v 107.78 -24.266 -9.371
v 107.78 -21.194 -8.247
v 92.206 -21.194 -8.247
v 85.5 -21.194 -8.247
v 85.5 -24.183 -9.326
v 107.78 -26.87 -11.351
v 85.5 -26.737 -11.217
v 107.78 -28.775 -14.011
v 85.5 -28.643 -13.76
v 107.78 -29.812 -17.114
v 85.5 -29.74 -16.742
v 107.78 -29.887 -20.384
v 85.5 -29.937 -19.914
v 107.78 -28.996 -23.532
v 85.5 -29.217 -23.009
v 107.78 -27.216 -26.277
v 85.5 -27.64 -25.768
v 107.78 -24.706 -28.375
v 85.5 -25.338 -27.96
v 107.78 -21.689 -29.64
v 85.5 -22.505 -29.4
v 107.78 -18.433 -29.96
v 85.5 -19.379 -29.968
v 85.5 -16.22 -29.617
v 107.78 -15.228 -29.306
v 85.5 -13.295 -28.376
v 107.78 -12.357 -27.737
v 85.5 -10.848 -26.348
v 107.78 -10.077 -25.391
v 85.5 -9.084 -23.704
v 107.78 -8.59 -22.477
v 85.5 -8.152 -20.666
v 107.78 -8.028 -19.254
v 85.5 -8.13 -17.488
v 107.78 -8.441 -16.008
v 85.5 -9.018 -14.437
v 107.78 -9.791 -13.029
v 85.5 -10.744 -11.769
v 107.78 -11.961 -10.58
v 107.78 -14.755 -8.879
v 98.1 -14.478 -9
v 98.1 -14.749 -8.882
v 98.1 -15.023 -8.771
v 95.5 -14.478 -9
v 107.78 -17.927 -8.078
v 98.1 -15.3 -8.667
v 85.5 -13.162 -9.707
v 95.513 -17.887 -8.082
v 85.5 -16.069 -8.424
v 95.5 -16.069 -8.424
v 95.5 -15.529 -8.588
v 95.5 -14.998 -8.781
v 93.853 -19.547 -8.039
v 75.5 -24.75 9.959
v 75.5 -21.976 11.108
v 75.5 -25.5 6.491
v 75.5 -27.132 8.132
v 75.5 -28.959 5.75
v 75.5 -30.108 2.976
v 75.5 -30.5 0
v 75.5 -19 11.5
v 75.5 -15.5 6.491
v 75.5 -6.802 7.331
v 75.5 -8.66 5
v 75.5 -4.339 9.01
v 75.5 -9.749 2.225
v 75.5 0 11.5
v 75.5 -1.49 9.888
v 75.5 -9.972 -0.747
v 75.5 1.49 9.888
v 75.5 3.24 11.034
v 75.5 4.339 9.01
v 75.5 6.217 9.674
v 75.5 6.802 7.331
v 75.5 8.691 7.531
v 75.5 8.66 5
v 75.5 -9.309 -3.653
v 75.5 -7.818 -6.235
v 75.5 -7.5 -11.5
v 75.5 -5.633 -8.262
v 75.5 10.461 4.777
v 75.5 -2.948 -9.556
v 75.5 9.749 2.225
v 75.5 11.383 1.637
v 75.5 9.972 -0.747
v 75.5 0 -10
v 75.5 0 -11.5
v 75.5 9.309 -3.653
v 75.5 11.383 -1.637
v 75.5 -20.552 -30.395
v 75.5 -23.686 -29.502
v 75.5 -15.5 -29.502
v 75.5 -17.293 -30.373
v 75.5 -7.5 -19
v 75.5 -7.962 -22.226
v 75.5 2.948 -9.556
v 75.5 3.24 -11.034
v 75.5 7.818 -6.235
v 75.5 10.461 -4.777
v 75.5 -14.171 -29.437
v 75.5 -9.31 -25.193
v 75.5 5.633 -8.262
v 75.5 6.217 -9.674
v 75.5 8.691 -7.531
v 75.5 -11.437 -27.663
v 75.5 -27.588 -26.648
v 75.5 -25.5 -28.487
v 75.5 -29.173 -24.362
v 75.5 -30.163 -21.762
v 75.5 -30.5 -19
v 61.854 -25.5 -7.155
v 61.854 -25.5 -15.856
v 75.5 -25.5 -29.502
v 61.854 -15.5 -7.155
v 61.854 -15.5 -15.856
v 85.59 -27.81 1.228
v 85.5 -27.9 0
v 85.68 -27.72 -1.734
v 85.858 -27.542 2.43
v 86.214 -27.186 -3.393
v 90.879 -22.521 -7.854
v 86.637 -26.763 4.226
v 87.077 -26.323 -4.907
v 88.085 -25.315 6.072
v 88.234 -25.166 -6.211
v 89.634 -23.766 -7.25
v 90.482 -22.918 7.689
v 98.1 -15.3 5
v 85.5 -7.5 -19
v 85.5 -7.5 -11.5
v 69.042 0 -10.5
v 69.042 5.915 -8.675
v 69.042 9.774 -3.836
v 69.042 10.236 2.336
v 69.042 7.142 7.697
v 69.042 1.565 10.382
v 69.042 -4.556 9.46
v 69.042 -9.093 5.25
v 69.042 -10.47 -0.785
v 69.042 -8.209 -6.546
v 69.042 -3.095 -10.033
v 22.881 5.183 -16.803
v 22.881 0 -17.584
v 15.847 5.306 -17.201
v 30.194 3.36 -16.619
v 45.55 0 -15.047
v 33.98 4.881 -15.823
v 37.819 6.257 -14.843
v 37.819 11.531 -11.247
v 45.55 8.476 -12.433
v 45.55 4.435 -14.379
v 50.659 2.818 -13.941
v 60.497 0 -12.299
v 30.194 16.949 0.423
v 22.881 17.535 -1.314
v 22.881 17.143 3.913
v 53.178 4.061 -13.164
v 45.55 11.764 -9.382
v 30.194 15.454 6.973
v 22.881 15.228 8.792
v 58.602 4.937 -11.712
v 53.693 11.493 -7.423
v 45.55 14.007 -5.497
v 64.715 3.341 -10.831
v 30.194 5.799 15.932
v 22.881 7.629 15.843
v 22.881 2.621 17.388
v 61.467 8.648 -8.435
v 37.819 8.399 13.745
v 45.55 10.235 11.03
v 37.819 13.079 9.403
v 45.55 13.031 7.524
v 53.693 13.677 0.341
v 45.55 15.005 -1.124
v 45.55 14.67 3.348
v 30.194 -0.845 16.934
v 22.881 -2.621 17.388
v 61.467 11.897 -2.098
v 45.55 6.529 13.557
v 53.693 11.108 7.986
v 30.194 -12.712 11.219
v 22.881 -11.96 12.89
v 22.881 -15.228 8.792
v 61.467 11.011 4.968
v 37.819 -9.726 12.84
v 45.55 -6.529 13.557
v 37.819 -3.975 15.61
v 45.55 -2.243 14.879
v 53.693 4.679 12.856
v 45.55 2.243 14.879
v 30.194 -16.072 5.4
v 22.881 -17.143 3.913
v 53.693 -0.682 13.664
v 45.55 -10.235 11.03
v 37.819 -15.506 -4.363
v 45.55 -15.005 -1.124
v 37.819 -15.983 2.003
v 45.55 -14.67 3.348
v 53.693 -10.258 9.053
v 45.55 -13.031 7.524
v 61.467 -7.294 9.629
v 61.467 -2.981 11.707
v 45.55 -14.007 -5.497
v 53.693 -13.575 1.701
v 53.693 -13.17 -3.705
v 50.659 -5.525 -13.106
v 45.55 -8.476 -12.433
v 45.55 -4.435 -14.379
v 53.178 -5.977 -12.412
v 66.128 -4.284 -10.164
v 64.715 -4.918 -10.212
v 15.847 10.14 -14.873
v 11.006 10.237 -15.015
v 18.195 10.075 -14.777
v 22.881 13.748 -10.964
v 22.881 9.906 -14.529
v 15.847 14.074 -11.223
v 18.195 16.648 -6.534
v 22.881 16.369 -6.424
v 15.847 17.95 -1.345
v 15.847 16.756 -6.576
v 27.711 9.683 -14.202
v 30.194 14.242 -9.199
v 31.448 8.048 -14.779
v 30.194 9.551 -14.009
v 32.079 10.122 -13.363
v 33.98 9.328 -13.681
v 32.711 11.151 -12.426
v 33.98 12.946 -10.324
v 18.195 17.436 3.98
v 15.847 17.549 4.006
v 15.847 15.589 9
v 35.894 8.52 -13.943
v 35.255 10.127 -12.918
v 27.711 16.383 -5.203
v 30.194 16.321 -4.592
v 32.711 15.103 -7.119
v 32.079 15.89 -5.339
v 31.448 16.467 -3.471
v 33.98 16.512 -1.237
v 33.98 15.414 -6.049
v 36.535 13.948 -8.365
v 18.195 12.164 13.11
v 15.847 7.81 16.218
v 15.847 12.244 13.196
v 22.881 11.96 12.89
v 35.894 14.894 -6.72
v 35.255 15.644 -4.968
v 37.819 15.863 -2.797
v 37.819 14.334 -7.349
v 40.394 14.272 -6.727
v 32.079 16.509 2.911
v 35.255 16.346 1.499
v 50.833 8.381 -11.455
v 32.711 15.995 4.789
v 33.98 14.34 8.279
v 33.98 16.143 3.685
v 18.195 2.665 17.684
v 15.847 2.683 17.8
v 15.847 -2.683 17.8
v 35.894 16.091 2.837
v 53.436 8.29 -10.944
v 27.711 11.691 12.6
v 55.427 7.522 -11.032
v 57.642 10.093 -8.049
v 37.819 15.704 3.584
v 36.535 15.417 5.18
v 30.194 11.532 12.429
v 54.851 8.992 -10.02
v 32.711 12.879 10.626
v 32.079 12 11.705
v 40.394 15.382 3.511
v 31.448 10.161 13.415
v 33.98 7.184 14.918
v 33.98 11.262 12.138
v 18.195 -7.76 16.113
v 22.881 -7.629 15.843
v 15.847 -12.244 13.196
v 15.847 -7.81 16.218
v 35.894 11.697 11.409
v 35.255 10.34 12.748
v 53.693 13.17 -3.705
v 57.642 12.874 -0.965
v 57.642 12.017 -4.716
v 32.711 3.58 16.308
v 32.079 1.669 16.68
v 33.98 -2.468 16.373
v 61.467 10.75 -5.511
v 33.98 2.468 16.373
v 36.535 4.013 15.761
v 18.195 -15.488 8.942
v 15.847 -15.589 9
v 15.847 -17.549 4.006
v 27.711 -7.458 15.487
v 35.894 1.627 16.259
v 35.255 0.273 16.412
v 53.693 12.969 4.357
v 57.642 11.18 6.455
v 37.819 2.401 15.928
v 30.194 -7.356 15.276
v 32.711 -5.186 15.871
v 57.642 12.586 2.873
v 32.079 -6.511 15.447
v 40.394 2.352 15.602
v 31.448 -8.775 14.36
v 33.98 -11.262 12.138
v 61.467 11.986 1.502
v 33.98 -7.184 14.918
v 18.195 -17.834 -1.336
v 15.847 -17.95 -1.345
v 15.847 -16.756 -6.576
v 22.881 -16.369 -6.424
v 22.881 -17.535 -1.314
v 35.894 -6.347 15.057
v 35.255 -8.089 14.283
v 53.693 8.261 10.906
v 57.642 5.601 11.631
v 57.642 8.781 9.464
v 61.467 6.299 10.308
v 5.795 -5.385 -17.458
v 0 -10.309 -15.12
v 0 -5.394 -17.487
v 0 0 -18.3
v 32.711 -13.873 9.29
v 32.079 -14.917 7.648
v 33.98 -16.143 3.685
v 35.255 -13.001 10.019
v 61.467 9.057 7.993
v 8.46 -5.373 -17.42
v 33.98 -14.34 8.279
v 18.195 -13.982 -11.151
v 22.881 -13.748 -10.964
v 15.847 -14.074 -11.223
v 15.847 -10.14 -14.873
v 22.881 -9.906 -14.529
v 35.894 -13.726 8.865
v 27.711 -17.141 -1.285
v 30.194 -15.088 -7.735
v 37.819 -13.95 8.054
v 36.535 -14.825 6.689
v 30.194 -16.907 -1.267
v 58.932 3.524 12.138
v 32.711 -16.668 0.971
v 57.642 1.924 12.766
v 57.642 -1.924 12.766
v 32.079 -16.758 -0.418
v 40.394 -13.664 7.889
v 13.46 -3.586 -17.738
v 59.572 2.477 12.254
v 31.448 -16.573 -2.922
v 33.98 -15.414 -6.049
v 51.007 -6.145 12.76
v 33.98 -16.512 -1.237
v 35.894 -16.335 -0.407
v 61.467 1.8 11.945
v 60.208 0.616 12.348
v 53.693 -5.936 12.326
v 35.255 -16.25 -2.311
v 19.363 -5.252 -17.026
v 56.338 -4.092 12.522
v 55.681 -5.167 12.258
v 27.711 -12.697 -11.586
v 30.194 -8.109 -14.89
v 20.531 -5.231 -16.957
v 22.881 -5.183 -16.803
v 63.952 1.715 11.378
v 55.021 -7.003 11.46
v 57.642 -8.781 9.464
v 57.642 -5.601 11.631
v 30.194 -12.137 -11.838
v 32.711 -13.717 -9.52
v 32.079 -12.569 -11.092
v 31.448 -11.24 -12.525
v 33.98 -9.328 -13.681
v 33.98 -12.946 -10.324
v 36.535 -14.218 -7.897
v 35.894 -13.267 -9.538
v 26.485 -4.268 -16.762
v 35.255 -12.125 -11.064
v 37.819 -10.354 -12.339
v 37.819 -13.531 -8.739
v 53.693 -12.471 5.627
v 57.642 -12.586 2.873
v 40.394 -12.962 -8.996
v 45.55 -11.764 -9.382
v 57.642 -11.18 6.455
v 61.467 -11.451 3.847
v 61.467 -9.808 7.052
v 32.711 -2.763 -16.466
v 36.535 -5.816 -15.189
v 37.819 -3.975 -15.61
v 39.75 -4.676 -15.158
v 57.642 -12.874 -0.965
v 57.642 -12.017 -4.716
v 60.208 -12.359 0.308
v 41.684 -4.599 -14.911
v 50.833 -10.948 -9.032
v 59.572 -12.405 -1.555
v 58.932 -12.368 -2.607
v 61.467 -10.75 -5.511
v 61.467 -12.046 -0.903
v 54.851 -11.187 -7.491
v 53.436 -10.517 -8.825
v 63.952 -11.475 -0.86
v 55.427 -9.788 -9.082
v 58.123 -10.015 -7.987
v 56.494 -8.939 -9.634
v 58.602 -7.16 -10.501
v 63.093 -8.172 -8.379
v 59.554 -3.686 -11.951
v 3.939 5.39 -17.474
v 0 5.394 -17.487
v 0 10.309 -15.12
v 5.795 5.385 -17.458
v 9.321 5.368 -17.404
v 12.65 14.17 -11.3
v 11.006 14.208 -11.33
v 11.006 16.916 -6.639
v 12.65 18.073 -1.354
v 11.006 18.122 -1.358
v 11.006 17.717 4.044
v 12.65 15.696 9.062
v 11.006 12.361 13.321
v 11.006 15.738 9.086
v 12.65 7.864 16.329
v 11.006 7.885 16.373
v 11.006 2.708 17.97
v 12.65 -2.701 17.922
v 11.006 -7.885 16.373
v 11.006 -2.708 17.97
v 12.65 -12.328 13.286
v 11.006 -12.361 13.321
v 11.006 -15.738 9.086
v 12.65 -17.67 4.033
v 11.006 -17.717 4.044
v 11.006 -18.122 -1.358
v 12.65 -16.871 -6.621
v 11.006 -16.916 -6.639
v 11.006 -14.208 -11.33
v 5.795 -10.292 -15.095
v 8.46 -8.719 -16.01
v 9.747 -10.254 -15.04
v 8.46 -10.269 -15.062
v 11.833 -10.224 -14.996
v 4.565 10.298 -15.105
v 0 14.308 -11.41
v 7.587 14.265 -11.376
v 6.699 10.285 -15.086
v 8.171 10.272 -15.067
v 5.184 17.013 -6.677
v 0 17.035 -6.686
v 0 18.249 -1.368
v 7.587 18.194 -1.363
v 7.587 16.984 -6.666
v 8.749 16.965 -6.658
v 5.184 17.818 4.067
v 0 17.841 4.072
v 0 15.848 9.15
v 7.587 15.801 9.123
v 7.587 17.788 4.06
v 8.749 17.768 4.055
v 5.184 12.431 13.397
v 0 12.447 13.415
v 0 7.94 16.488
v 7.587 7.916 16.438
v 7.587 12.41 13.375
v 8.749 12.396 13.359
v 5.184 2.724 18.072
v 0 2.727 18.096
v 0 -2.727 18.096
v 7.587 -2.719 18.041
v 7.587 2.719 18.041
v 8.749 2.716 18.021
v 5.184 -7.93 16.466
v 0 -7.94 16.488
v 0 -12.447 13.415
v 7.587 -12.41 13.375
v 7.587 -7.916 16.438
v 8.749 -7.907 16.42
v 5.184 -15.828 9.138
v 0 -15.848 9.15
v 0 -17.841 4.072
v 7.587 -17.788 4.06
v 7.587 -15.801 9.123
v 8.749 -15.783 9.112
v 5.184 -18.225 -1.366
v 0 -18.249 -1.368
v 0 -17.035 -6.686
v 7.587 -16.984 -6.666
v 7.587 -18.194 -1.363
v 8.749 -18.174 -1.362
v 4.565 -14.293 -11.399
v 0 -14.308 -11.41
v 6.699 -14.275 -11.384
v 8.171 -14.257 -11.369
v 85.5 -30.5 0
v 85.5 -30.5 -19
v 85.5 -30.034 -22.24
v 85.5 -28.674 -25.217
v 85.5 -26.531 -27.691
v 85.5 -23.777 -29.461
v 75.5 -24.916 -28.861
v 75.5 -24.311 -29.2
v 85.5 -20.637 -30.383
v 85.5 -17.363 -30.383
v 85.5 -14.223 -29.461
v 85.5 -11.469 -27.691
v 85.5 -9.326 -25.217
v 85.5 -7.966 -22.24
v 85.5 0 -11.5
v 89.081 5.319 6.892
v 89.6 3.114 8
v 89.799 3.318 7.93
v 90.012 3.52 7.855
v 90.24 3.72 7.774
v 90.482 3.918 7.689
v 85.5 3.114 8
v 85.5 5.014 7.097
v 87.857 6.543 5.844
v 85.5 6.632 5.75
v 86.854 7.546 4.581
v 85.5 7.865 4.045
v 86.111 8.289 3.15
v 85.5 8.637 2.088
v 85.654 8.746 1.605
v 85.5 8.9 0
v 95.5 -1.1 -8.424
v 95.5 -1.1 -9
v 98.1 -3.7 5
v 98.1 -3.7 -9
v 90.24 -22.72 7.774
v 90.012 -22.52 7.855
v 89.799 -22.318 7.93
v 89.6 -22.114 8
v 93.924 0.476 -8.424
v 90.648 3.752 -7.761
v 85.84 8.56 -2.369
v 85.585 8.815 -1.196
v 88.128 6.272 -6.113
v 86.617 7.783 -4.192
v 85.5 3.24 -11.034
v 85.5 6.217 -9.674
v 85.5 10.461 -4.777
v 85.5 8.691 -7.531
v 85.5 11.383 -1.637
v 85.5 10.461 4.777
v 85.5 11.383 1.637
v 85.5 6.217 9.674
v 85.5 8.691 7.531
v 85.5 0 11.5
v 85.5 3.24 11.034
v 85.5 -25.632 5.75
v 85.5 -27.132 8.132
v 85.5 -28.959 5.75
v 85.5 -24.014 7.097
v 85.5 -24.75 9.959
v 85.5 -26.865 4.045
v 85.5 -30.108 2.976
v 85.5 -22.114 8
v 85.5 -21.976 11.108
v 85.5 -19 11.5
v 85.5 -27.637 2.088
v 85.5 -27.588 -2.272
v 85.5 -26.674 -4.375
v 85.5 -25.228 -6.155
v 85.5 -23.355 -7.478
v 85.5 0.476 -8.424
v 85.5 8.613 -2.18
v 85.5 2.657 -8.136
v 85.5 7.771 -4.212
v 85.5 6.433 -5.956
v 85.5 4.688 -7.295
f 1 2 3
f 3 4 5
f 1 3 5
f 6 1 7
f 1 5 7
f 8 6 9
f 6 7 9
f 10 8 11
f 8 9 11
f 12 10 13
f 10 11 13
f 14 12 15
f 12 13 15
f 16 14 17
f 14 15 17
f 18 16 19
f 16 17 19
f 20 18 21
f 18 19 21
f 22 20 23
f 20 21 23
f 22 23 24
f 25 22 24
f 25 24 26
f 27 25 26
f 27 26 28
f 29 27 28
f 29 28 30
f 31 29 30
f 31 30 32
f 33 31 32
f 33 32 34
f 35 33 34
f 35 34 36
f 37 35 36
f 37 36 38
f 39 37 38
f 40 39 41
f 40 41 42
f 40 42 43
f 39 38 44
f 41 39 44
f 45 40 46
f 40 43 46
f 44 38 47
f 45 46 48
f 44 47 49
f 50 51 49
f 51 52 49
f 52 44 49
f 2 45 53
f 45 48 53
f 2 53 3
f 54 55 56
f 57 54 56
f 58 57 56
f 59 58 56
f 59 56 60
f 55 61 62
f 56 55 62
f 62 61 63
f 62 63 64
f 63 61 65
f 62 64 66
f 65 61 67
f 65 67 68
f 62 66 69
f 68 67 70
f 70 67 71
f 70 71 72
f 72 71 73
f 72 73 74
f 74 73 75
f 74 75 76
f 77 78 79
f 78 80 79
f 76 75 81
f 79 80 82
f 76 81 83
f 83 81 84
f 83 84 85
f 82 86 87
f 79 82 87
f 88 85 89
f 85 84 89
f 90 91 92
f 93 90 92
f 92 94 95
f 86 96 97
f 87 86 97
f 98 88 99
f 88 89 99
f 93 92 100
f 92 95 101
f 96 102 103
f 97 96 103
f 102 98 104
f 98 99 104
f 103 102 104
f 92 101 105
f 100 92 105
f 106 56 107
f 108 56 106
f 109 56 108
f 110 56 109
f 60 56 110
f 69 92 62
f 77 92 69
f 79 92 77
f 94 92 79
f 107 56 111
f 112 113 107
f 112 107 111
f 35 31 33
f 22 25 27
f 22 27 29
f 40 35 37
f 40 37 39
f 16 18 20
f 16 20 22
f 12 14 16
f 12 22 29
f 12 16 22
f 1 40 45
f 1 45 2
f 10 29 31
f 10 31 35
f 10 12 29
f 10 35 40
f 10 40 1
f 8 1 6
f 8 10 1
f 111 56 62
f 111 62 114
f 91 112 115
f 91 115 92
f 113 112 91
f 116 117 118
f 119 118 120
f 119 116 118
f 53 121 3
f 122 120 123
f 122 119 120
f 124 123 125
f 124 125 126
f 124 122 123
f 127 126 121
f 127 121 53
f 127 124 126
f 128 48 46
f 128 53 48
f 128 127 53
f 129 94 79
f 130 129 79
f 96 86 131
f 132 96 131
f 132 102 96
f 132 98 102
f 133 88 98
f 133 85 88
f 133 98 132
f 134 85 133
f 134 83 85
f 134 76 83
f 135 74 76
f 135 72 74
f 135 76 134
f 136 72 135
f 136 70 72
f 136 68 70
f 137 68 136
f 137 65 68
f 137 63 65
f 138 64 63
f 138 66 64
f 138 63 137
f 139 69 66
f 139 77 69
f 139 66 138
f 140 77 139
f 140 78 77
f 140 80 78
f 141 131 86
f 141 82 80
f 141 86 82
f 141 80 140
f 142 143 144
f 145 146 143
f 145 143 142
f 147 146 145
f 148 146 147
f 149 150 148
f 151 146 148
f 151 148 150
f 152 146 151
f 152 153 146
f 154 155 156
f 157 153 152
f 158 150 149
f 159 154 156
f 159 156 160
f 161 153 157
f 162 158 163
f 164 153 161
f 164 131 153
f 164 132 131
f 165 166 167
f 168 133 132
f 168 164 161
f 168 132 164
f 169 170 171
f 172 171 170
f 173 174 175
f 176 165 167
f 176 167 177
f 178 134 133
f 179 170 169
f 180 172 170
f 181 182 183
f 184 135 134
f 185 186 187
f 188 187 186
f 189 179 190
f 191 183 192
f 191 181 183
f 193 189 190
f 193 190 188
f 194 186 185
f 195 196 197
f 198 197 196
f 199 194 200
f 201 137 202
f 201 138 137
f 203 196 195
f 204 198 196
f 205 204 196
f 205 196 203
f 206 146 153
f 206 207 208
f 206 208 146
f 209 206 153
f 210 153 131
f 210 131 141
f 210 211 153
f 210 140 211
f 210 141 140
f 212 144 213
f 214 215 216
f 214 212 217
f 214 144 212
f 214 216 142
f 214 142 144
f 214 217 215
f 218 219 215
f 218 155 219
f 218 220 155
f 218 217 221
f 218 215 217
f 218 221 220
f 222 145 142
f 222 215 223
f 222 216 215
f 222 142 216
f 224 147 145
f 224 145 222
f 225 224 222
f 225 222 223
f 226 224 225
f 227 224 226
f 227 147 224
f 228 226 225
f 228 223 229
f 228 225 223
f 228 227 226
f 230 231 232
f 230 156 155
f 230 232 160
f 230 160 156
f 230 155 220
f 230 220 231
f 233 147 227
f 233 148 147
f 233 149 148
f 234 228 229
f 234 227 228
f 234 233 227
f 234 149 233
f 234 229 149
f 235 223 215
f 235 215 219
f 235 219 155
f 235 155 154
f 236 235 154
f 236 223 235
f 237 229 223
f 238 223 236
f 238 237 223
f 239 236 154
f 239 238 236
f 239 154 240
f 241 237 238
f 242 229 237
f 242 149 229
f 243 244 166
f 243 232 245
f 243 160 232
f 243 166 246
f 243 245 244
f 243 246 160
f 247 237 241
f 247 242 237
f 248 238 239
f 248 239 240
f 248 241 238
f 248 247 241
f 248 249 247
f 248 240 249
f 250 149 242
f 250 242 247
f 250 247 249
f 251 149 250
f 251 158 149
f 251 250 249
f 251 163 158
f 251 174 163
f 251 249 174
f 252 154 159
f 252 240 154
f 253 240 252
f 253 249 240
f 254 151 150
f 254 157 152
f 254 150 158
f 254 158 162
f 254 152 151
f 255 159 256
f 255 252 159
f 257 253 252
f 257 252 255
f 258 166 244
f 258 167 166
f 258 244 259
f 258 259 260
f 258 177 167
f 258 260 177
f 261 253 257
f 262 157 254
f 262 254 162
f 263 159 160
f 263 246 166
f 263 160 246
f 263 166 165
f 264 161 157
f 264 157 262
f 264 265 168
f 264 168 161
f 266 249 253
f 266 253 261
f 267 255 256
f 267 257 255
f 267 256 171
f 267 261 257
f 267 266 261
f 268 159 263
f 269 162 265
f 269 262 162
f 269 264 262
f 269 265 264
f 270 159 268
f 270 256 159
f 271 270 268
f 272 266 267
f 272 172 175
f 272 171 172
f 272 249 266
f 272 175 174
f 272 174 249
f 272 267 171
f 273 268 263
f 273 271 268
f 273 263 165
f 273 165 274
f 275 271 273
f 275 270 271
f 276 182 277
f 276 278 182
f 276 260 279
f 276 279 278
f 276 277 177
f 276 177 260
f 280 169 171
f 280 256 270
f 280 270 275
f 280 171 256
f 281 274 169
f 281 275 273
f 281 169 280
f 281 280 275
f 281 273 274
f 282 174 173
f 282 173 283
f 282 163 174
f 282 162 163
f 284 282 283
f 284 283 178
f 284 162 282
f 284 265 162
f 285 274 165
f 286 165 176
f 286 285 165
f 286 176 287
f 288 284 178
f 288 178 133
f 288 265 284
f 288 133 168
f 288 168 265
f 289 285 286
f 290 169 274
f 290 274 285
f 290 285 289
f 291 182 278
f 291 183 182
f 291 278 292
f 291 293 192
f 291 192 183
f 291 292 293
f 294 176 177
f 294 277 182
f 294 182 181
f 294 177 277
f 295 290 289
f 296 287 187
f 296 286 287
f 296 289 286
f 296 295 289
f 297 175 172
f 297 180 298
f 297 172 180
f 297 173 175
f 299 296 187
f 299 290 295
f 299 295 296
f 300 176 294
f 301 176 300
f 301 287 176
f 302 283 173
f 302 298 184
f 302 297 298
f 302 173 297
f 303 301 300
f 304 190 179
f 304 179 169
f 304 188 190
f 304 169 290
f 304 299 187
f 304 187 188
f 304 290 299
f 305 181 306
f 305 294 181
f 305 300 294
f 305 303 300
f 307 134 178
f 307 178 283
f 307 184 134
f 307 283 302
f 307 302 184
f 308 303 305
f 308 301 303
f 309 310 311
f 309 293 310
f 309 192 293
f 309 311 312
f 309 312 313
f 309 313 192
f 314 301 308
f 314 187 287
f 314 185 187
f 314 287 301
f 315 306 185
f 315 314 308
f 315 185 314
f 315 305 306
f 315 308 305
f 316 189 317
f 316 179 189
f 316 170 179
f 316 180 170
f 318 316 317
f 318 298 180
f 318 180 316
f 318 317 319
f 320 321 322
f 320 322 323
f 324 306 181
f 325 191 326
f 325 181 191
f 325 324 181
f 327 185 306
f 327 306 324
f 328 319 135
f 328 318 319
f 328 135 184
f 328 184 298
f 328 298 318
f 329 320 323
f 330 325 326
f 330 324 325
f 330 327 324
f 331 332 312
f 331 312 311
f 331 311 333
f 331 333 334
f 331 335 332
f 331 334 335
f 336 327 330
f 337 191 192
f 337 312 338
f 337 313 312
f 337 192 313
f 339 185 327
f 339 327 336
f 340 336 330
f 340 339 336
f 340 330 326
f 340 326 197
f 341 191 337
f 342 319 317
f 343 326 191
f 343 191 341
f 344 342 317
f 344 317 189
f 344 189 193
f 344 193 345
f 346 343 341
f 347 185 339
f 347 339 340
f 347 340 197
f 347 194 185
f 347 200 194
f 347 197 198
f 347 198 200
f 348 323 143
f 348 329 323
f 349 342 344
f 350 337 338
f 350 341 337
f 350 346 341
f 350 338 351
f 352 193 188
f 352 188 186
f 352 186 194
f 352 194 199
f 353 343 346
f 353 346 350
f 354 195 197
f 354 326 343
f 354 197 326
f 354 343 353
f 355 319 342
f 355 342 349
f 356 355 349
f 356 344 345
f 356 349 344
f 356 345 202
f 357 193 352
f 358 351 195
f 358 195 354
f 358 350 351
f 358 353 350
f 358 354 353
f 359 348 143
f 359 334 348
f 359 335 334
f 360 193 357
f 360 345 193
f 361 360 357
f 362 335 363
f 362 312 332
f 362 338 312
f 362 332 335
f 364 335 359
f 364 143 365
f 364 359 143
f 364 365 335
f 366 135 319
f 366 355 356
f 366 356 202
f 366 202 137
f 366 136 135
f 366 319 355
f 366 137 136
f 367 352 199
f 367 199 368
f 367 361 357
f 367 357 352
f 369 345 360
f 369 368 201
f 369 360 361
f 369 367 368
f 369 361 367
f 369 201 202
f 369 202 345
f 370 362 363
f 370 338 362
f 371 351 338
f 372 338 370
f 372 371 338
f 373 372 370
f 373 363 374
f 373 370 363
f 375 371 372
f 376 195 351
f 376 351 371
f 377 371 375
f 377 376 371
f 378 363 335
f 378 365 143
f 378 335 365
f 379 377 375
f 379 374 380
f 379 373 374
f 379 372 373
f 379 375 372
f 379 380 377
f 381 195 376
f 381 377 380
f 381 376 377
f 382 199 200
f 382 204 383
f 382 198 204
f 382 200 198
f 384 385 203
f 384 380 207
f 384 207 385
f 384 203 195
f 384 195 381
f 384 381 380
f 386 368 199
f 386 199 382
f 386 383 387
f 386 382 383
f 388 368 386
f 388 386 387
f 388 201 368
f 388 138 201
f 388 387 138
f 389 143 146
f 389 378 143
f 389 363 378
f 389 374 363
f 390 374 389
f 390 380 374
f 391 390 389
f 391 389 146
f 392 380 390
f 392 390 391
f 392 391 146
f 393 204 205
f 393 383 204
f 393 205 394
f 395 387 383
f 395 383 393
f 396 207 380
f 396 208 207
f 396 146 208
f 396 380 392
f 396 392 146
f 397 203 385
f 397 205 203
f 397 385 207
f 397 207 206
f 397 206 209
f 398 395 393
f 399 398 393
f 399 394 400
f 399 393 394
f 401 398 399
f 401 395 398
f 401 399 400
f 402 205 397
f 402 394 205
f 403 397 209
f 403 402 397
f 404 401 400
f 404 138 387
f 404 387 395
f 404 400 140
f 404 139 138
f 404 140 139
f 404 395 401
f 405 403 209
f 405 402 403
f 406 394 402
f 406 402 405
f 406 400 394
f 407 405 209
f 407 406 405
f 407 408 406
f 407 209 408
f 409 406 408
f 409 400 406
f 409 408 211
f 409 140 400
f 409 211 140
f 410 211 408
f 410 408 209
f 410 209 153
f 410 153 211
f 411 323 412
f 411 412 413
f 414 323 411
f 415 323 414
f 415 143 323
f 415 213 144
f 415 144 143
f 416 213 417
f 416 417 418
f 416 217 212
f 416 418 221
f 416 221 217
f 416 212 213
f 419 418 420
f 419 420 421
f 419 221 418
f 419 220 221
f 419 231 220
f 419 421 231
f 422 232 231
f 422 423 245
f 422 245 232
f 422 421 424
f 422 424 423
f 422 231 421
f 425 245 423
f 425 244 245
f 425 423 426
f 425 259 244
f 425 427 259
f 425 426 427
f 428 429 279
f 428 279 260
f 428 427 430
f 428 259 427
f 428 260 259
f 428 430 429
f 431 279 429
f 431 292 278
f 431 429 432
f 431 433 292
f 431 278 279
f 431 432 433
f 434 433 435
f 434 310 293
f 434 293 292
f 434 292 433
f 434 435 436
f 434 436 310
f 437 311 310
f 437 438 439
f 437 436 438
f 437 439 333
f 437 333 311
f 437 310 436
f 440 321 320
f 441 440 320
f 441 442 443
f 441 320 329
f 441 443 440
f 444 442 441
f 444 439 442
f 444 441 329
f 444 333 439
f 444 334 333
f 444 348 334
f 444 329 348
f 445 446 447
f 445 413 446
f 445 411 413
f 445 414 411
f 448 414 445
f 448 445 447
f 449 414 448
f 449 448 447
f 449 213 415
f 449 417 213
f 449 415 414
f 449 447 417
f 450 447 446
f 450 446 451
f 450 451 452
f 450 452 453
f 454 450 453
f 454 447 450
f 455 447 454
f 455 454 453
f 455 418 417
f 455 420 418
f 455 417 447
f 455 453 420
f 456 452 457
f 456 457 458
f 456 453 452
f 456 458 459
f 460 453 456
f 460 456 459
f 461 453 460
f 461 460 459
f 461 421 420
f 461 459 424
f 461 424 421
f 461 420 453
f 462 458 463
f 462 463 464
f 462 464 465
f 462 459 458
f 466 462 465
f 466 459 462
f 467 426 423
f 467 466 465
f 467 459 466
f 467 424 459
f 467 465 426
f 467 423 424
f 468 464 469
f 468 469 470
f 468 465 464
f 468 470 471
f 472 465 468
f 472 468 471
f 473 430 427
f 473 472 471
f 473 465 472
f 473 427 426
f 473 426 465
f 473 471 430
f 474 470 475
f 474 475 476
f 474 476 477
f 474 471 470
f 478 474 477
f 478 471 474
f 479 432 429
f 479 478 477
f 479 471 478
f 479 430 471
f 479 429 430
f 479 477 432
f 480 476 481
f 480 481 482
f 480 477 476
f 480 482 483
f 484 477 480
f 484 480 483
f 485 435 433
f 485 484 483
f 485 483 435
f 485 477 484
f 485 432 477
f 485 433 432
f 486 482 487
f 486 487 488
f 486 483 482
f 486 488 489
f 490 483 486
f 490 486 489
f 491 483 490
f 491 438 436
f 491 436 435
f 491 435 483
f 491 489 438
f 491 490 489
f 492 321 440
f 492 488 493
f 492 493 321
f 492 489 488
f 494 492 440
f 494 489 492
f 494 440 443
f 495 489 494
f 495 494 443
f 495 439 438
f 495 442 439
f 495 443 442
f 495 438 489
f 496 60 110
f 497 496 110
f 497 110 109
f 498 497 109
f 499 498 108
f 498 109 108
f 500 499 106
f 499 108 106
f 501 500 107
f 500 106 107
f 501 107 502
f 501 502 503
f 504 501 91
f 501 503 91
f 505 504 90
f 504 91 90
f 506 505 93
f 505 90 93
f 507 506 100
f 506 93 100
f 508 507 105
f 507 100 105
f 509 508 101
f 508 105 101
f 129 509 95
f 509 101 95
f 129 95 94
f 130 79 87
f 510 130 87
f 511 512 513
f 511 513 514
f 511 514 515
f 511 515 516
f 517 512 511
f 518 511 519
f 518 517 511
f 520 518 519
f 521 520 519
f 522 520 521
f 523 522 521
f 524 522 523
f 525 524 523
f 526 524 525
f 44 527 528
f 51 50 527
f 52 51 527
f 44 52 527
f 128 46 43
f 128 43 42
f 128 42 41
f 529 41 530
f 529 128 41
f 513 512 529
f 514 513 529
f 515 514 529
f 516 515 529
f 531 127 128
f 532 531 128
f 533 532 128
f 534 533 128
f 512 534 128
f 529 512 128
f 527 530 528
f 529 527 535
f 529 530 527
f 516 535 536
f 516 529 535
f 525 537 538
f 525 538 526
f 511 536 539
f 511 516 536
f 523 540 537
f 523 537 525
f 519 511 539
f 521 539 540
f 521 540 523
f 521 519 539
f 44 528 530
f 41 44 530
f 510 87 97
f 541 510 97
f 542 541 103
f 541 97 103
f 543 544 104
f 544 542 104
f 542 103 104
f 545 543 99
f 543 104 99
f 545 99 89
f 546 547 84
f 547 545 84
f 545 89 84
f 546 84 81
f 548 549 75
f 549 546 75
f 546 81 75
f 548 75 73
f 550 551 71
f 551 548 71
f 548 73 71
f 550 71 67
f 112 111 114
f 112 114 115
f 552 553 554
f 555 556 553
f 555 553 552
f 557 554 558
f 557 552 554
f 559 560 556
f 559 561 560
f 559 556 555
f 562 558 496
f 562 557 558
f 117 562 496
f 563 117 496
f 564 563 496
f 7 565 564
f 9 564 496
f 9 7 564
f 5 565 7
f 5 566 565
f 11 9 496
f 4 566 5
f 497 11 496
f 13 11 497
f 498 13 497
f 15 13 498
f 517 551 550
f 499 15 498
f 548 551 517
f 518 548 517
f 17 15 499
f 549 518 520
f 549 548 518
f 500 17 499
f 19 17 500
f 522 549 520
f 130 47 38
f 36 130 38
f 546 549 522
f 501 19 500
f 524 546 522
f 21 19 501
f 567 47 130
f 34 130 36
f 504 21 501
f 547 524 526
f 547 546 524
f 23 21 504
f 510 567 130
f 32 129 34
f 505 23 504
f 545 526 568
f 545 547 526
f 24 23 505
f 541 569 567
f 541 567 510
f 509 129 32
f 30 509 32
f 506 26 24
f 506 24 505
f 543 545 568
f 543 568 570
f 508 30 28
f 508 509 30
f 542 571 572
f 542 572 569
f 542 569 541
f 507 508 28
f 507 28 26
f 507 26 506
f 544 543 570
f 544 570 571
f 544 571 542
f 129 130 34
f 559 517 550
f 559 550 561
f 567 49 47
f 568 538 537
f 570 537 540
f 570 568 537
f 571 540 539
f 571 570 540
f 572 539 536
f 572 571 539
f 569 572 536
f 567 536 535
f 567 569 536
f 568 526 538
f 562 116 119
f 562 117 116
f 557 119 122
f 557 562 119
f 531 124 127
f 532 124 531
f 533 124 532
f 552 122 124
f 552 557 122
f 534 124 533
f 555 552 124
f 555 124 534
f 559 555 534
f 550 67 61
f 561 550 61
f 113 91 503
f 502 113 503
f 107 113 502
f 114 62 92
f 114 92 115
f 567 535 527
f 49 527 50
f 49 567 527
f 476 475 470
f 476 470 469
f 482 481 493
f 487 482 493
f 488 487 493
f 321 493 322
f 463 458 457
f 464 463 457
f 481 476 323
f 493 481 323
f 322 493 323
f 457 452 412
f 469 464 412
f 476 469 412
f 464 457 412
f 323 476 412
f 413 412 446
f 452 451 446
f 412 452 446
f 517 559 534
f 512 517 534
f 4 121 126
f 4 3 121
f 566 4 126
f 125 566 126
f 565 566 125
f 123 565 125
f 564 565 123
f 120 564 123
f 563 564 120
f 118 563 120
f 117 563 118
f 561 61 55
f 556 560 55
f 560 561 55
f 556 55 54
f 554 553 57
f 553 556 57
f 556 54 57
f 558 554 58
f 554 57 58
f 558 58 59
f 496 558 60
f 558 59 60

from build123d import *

# Parameters (mm, degrees)
BOSS_EXTRUDE1_DEPTH = 10
BOSS_EXTRUDE2_START = -3.5
BOSS_EXTRUDE2_DEPTH = 17
BOSS_EXTRUDE3_START = -5
BOSS_EXTRUDE3_DEPTH = 10
SKETCH6_OUTSIDE_W   = 74.788
SKETCH6_OUTSIDE_H   = 74.788
CUT_EXTRUDE1_DEPTH  = 10
SKETCH5_R           = 10.975
BOSS_EXTRUDE4_DEPTH = 22.28
CHAMFER2_SIZE       = 8.5
CHAMFER2_SIZE_2     = 3


with BuildPart() as part:
    # Sketch1 → Revolve1 (revolve)
    with BuildSketch(Plane(origin=(0, 0, 0), x_dir=(1, 0, 0), z_dir=(0, 1, 0))):
        with BuildLine():
            Line((75.5, 0), (75.5, 10))
            add(Edge.make_bspline(
                [(0, 18.3), (9.740701491, 18.3), (26.990075189, 17.742872667), (54.88230213, 14.080751962), (69.777131961, 10), (75.5, 10)],
                knots=[0, 0, 0, 0, 0.31632777, 0.808812889, 1, 1, 1, 1], degree=3))
            Line((0, 18.3), (0, 0))
            Line((0, 0), (75.5, 0))
        make_face()
    revolve(axis=Axis((0, 0, 0), (1, 0, 0)))

    # Sketch2 → Boss-Extrude1 (add)
    with BuildSketch(Plane(origin=(75.5, 0, 0), x_dir=(0, 0, -1), z_dir=(1, 0, 0))):
        with BuildLine():
            Line((-11.5, 0), (-11.5, -19))
            ThreePointArc((-11.5, -19), (-8.131727984, -27.131727984), (0, -30.5))
            Line((0, -30.5), (19, -30.5))
            ThreePointArc((19, -30.5), (30.5, -19), (19, -7.5))
            Line((19, -7.5), (11.5, -7.5))
            Line((11.5, -7.5), (11.5, 0))
            ThreePointArc((11.5, 0), (0, 11.5), (-11.5, 0))
        make_face()
    extrude(amount=BOSS_EXTRUDE1_DEPTH)

    # Sketch3 → Boss-Extrude2 (add)
    with BuildSketch(Plane.XY.offset(11.5).offset(BOSS_EXTRUDE2_START)):
        Polygon((85.5, -27.9), (98.1, -15.3), (98.1, -3.7), (85.5, 8.9), align=None)
    extrude(amount=-BOSS_EXTRUDE2_DEPTH)

    # Sketch4 → Boss-Extrude3 (add)
    with BuildSketch(Plane(origin=(0, -30.5, 0), x_dir=(-1, 0, 0), z_dir=(0, -1, 0)).offset(BOSS_EXTRUDE3_START)):
        Polygon((-75.5, -6.49101914), (-61.854263107, 7.154717753), (-61.854263107, 15.856079818), (-75.5, 29.50181671), align=None)
    extrude(amount=-BOSS_EXTRUDE3_DEPTH)

    # Sketch6 outside → Cut-Extrude1 (cut)
    with BuildSketch(Plane(origin=(85.5, 0, 0), x_dir=(0, 0, -1), z_dir=(1, 0, 0))):
        with Locations((6.1, -6.1)):
            Rectangle(SKETCH6_OUTSIDE_W, SKETCH6_OUTSIDE_H)
        with BuildLine():
            Line((8.423507913, 0.476492087), (8.423507913, -19.476492087))
            ThreePointArc((8.423507913, -19.476492087), (0, -27.9), (-8.423507913, -19.476492087))
            Line((-8.423507913, -19.476492087), (-8.423507913, 0.476492087))
            ThreePointArc((-8.423507913, 0.476492087), (0, 8.9), (8.423507913, 0.476492087))
        make_face(mode=Mode.SUBTRACT)
    extrude(amount=CUT_EXTRUDE1_DEPTH, mode=Mode.SUBTRACT)

    # Sketch5 → Boss-Extrude4 (add)
    with BuildSketch(Plane(origin=(85.5, 0, 0), x_dir=(0, 0, -1), z_dir=(1, 0, 0))):
        with Locations(Location((19, -19, 0), (0, 0, 191.531863493))):
            Circle(SKETCH5_R)
    extrude(amount=BOSS_EXTRUDE4_DEPTH)

    # Chamfer2
    # the kernel refuses this chamfer: 8.5, 3 mm, written as the material it takes off along each edge
    with BuildSketch(Plane(origin=(98.1, -37.353356339, 8), x_dir=(-0.9999177197745295, 0, 0.012827847867252683), z_dir=(0, 1, 0))) as chamfer2_piece_1:
        Polygon((CHAMFER2_SIZE * 0.999917719775, -CHAMFER2_SIZE * 0.0128278478673), (-CHAMFER2_SIZE_2 * 0.0128278478673, -CHAMFER2_SIZE_2 * 0.999917719775), (0, 0), align=None)
    extrude(amount=55.706712677, mode=Mode.SUBTRACT)


solid = part.part
